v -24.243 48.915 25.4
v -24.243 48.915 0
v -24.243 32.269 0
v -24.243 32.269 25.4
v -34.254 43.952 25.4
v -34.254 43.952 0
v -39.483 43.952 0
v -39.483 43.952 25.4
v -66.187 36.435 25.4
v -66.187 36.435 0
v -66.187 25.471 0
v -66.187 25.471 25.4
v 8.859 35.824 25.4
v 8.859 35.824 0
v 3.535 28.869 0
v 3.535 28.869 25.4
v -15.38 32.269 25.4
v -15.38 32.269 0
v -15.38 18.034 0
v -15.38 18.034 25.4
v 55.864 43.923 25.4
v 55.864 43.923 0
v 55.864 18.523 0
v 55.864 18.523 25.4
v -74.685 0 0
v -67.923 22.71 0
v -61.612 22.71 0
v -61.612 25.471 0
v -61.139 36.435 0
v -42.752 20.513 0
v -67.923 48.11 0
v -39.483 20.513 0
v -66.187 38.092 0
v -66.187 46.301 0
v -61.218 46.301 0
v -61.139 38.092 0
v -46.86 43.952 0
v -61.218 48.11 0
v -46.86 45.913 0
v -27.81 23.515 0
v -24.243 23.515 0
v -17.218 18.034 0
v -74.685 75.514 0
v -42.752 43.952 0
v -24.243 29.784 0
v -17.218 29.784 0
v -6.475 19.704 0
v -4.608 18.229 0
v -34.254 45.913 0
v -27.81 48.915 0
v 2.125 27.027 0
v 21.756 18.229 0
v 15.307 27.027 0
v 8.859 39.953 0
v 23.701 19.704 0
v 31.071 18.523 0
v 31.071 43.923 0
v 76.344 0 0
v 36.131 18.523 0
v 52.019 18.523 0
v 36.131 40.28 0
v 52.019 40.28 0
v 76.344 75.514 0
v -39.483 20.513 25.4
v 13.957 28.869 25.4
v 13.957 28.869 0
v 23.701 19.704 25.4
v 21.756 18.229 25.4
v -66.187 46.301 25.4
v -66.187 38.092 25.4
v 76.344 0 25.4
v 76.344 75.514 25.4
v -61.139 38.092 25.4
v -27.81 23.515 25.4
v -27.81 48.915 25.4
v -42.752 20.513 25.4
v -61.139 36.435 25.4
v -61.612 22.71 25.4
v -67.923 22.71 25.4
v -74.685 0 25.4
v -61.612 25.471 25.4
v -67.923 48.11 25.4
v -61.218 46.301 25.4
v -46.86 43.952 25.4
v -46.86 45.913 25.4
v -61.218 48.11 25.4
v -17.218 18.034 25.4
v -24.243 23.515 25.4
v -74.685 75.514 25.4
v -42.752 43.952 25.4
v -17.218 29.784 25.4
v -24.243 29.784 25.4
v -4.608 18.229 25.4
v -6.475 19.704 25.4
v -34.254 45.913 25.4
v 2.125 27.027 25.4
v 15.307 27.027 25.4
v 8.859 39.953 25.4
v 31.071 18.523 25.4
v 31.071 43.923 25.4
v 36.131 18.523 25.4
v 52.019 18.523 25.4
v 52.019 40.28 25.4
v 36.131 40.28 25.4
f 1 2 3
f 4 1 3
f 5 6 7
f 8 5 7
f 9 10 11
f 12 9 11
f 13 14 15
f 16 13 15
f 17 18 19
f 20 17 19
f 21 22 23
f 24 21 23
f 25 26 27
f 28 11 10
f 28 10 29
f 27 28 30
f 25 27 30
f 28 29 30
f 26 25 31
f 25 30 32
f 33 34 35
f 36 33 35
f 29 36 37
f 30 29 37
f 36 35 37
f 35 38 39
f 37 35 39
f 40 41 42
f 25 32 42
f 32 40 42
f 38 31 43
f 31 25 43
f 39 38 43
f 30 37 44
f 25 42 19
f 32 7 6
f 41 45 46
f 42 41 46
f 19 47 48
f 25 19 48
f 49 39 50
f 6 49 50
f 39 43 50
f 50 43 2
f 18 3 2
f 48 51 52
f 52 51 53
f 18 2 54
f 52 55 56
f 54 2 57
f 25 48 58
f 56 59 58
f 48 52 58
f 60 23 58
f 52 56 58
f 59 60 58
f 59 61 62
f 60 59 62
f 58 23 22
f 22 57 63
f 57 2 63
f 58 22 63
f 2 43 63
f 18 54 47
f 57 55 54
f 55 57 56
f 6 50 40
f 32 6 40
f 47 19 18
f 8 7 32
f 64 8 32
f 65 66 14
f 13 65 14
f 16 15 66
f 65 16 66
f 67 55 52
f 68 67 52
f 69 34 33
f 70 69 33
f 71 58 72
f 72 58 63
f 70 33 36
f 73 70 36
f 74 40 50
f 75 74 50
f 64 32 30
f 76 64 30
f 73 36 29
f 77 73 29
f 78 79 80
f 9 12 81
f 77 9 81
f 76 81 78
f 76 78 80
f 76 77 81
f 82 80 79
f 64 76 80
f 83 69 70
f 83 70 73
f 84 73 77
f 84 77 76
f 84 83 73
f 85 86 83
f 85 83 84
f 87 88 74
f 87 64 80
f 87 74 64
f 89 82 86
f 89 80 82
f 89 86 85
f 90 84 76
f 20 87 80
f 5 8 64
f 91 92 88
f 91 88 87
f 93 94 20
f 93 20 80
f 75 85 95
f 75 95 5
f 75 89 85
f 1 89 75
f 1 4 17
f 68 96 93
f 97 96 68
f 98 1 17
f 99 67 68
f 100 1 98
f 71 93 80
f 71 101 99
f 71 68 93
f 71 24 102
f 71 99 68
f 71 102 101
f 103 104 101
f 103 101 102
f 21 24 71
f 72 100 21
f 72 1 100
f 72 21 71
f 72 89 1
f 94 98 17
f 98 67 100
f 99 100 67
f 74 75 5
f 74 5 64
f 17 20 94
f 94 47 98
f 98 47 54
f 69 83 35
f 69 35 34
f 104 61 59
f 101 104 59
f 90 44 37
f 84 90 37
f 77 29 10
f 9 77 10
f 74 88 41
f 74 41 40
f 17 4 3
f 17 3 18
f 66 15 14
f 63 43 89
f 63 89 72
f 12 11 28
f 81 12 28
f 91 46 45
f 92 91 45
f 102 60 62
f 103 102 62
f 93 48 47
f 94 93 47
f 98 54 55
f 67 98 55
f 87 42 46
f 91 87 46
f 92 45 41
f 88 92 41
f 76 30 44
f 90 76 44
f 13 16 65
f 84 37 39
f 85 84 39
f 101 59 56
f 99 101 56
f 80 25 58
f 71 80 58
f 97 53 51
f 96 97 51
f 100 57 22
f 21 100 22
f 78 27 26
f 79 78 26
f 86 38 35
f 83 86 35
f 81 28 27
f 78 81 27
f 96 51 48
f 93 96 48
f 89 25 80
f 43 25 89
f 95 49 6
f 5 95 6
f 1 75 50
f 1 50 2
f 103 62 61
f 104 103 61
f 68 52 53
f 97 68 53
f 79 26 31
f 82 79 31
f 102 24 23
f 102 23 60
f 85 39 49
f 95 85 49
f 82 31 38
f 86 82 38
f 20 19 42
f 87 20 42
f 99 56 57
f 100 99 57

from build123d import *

# Parameters (mm, degrees)
F0_W     = 151.028797
F0_H     = 75.514413
F1_DEPTH = 25.4


with BuildPart() as f1:
    # F0 (on Top) → F1 (new body)
    with BuildSketch(Plane.XY):
        with Locations((0.829794, 37.757206)):
            Rectangle(F0_W, F0_H)
        Polygon((-67.922803, 22.709847), (-67.922803, 48.109847), (-66.187397, 48.109847), (-61.217834, 48.109847), (-61.217834, 46.300741), (-66.187397, 46.300741), (-66.187397, 38.091835), (-61.138953, 38.091835), (-61.138953, 36.43531), (-66.187397, 36.43531), (-66.187397, 25.470717), (-61.612244, 25.470717), (-61.612244, 22.709847), (-66.187397, 22.709847), align=None, mode=Mode.SUBTRACT)
        Polygon((-42.751573, 20.513045), (-42.751573, 43.952015), (-46.860394, 43.952015), (-46.860394, 45.913045), (-34.253778, 45.913045), (-34.253778, 43.952015), (-39.48319, 43.952015), (-39.48319, 20.513045), align=None, mode=Mode.SUBTRACT)
        Polygon((-27.809842, 23.514566), (-27.809842, 48.914566), (-24.243034, 48.914566), (-24.243034, 32.269461), (-17.217501, 32.269461), (-15.380056, 32.269461), (-15.380056, 18.033946), (-17.217501, 18.033946), (-17.217501, 29.783503), (-24.243034, 29.783503), (-24.243034, 23.514566), align=None, mode=Mode.SUBTRACT)
        Polygon((-4.607868, 18.229239), (-6.475495, 19.70368), (8.858709, 39.952685), (23.701419, 19.70368), (21.756015, 18.229239), (15.307362, 27.026744), (2.12542, 27.026744), align=None, mode=Mode.SUBTRACT)
        Polygon((36.130898, 18.522699), (31.071138, 18.522699), (31.071138, 43.922699), (36.130898, 43.922699), (52.018548, 43.922699), (55.863969, 43.922699), (55.863969, 18.522699), (52.018548, 18.522699), (52.018548, 40.279673), (36.130898, 40.279673), align=None, mode=Mode.SUBTRACT)
        Polygon((13.956968, 28.869005), (8.858709, 35.824248), (3.53542, 28.869005), align=None)
    extrude(amount=F1_DEPTH)


solid = f1.part
